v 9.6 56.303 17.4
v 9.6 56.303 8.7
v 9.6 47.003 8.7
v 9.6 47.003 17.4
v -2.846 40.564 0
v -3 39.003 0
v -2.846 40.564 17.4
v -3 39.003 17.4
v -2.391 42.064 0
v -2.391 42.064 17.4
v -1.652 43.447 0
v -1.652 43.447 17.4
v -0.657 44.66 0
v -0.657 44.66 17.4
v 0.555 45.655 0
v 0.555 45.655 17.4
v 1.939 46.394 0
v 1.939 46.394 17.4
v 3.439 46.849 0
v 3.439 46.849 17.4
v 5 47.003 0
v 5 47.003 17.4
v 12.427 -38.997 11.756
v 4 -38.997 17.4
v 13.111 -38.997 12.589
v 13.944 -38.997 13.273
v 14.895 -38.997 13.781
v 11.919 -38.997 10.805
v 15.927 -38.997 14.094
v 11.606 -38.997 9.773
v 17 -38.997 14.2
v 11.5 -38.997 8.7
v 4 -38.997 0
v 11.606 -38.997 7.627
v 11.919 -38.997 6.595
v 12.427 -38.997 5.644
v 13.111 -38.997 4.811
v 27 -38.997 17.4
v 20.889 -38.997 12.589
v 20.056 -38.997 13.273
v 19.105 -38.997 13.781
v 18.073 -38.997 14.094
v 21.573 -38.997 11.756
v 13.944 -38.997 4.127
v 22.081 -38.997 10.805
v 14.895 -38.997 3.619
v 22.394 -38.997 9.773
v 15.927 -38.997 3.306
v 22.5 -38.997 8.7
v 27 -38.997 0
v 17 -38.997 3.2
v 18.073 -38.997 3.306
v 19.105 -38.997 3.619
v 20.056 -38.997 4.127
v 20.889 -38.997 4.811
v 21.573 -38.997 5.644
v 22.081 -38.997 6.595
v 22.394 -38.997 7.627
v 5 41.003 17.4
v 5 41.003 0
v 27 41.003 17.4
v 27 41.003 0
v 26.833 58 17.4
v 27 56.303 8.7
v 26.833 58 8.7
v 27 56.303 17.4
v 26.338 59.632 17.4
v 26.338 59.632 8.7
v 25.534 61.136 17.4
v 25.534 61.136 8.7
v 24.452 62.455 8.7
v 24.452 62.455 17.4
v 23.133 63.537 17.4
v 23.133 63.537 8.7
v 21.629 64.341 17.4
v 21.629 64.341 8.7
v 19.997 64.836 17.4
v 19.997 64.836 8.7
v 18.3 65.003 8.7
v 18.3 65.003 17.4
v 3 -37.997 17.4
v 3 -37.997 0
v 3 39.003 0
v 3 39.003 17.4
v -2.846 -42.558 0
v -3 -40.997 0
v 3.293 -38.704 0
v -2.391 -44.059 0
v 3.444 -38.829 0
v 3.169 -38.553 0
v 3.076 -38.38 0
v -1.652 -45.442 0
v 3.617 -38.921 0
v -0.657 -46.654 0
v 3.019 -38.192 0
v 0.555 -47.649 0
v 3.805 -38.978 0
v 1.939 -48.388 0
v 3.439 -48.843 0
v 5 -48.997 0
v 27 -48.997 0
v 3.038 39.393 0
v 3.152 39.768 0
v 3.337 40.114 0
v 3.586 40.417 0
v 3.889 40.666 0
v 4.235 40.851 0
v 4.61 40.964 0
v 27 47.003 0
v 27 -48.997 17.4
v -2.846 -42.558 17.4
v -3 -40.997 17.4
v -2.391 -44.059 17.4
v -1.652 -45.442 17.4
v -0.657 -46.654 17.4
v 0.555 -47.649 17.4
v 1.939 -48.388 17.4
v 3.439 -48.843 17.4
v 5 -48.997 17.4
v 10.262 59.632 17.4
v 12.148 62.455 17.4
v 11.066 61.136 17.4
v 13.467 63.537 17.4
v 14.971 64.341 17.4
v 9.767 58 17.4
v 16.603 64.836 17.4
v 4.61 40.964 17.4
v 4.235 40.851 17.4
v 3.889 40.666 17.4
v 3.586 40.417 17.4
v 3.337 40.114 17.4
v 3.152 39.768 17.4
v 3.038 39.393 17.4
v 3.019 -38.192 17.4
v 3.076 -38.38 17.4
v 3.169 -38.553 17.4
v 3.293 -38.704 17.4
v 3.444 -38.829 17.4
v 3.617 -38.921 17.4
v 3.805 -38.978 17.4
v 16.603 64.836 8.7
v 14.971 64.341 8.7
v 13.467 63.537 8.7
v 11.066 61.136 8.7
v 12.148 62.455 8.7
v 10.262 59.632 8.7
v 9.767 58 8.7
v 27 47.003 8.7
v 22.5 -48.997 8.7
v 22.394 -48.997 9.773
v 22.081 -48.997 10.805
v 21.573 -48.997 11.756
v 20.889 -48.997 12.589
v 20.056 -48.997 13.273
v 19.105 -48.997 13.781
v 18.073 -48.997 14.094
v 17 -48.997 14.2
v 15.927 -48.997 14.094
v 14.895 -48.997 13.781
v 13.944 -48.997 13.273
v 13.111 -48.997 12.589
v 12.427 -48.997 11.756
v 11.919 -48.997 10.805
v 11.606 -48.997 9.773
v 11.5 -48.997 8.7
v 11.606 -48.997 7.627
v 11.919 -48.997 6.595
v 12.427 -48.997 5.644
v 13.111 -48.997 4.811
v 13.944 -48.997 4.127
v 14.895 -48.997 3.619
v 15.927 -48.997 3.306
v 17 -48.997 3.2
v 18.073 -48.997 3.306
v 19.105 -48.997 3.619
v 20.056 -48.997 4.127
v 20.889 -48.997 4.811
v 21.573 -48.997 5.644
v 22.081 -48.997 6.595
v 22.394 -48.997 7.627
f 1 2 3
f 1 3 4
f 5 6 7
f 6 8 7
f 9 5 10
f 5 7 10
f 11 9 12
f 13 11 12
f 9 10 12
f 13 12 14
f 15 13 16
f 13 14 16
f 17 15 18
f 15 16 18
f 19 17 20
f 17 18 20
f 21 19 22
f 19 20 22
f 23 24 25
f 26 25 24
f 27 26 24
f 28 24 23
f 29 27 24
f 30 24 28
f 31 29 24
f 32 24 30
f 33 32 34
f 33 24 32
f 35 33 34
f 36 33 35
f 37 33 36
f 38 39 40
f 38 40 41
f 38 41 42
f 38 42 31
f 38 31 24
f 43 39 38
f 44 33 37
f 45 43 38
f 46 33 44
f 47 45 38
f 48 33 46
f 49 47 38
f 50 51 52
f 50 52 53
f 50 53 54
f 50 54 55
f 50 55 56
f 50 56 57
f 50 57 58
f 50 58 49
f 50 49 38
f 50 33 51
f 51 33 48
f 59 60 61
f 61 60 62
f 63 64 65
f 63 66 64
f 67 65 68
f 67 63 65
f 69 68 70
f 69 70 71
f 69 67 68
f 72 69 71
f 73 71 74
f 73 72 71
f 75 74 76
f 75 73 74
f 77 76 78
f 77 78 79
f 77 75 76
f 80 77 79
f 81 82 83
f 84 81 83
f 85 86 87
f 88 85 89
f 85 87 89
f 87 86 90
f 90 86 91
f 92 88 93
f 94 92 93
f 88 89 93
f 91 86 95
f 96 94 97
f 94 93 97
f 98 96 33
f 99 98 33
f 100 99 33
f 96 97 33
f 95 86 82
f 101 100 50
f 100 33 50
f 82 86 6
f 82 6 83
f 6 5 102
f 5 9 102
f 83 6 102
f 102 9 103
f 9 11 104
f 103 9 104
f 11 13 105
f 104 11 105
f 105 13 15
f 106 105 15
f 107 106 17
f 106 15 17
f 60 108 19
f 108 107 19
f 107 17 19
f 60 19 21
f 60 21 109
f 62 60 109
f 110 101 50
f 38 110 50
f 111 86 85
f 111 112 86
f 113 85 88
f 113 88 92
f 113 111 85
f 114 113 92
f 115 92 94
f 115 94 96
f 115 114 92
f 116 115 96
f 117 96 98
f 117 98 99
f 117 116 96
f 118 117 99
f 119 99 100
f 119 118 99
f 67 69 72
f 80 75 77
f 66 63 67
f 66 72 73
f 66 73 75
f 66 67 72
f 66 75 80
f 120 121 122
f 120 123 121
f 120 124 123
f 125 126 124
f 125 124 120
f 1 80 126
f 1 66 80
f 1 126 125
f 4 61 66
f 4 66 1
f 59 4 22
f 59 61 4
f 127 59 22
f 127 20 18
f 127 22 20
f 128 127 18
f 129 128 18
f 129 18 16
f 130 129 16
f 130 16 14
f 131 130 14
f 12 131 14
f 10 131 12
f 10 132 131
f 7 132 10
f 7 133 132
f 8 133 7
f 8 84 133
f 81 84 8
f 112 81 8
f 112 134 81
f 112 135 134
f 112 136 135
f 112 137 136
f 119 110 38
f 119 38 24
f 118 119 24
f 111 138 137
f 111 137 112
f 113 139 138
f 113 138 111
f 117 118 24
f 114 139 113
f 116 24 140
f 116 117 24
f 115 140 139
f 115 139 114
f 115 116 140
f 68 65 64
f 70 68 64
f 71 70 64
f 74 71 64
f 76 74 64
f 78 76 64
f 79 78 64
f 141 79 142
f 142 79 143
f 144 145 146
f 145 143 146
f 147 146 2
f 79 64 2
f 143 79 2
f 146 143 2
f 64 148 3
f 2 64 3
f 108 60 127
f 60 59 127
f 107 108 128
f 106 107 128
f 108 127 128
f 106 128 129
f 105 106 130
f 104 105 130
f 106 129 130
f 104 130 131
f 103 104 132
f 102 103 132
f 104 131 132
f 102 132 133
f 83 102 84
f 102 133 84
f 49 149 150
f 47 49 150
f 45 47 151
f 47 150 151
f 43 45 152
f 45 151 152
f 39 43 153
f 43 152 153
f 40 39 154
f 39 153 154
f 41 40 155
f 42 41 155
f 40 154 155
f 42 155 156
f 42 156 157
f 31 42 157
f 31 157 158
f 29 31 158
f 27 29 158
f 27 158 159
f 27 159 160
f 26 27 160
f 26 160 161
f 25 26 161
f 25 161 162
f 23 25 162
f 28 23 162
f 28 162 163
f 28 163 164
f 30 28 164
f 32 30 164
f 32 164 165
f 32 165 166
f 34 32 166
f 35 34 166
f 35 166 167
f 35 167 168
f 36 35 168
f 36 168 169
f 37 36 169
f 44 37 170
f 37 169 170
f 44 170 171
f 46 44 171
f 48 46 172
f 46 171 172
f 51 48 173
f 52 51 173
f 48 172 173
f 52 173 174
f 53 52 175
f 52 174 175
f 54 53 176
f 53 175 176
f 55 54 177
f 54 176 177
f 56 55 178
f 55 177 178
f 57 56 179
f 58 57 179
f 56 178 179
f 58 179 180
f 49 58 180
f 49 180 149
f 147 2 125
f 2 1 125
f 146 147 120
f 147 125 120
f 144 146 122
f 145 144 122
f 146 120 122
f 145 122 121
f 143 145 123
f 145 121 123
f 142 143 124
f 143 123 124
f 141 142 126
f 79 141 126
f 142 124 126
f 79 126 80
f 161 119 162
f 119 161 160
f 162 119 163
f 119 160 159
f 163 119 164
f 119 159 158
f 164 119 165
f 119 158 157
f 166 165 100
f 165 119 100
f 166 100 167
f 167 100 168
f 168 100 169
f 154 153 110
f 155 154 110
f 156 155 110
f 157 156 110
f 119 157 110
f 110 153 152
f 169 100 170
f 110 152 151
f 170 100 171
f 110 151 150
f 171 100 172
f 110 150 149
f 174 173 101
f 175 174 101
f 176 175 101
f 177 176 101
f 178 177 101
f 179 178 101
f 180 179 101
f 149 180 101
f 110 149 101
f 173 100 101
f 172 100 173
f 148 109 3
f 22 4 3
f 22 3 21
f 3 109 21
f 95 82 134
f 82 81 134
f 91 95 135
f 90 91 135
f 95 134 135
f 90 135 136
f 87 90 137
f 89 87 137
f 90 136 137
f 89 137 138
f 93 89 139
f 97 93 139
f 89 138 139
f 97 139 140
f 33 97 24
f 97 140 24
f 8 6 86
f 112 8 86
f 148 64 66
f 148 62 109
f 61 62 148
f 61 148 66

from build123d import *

# Parameters (mm, degrees)
F0_W     = 24
F0_H     = 6
F0_H_2   = 10
F1_DEPTH = 17.4
F2_R     = 8
F3_R     = 2
F5_R     = 5.5
F6_DEPTH = 25
F7_R     = 1
F4_W     = 17.4
F4_H     = 8.7
F8_DEPTH = 18
F9_R     = 8.69999


# Not quite as in the source:
# - a fillet or chamfer is up to 0.001 mm smaller than in the source, because OpenCascade refuses the exact size


with BuildPart() as f1:
    # F0 (on Top) → F1 (new body)
    with BuildSketch(Plane.XY):
        Polygon((3, 41.0029157541), (3, 47.0029157541), (-3, 47.0029157541), (-3, -48.9970842459), (3, -48.9970842459), (3, -38.9970842459), align=None)
        with Locations((15, 44.0029157541)):
            Rectangle(F0_W, F0_H)
        with Locations((15, -43.9970842459)):
            Rectangle(F0_W, F0_H_2)
    extrude(amount=F1_DEPTH)

    # F2
    f2_edges = [f1.edges().sort_by_distance(p)[0] for p in [
        (-3, 47.002916, 8.7),
        (-3, -48.997084, 8.7),
    ]]
    fillet(f2_edges, radius=F2_R)

    # F3
    f3_edges = [f1.edges().sort_by_distance(p)[0] for p in [
        (3, 41.002916, 8.7),
    ]]
    fillet(f3_edges, radius=F3_R)

    # F5 (on face) → F6 (cut)
    with BuildSketch(Plane.XZ.offset(48.9970842459)):
        with Locations((17, 8.7)):
            Circle(F5_R)
    extrude(amount=-F6_DEPTH, mode=Mode.SUBTRACT)

    # F7
    f7_edges = [f1.edges().sort_by_distance(p)[0] for p in [
        (3, -38.997084, 8.7),
    ]]
    fillet(f7_edges, radius=F7_R)

    # F4 (on face) → F8 (join)
    with BuildSketch(Plane(origin=(0, 47.0029157541, 0), x_dir=(-1, 0, 0), z_dir=(0, 1, 0))):
        with Locations((-18.3, 13.05)):
            Rectangle(F4_W, F4_H)
    extrude(amount=F8_DEPTH)

    # F9 (radius 8.7 in the source; OpenCascade refuses exactly that, so slightly less here)
    f9_edges = [f1.edges().sort_by_distance(p)[0] for p in [
        (27, 65.002916, 13.05),
        (9.6, 65.002916, 13.05),
    ]]
    fillet(f9_edges, radius=F9_R)


solid = f1.part
